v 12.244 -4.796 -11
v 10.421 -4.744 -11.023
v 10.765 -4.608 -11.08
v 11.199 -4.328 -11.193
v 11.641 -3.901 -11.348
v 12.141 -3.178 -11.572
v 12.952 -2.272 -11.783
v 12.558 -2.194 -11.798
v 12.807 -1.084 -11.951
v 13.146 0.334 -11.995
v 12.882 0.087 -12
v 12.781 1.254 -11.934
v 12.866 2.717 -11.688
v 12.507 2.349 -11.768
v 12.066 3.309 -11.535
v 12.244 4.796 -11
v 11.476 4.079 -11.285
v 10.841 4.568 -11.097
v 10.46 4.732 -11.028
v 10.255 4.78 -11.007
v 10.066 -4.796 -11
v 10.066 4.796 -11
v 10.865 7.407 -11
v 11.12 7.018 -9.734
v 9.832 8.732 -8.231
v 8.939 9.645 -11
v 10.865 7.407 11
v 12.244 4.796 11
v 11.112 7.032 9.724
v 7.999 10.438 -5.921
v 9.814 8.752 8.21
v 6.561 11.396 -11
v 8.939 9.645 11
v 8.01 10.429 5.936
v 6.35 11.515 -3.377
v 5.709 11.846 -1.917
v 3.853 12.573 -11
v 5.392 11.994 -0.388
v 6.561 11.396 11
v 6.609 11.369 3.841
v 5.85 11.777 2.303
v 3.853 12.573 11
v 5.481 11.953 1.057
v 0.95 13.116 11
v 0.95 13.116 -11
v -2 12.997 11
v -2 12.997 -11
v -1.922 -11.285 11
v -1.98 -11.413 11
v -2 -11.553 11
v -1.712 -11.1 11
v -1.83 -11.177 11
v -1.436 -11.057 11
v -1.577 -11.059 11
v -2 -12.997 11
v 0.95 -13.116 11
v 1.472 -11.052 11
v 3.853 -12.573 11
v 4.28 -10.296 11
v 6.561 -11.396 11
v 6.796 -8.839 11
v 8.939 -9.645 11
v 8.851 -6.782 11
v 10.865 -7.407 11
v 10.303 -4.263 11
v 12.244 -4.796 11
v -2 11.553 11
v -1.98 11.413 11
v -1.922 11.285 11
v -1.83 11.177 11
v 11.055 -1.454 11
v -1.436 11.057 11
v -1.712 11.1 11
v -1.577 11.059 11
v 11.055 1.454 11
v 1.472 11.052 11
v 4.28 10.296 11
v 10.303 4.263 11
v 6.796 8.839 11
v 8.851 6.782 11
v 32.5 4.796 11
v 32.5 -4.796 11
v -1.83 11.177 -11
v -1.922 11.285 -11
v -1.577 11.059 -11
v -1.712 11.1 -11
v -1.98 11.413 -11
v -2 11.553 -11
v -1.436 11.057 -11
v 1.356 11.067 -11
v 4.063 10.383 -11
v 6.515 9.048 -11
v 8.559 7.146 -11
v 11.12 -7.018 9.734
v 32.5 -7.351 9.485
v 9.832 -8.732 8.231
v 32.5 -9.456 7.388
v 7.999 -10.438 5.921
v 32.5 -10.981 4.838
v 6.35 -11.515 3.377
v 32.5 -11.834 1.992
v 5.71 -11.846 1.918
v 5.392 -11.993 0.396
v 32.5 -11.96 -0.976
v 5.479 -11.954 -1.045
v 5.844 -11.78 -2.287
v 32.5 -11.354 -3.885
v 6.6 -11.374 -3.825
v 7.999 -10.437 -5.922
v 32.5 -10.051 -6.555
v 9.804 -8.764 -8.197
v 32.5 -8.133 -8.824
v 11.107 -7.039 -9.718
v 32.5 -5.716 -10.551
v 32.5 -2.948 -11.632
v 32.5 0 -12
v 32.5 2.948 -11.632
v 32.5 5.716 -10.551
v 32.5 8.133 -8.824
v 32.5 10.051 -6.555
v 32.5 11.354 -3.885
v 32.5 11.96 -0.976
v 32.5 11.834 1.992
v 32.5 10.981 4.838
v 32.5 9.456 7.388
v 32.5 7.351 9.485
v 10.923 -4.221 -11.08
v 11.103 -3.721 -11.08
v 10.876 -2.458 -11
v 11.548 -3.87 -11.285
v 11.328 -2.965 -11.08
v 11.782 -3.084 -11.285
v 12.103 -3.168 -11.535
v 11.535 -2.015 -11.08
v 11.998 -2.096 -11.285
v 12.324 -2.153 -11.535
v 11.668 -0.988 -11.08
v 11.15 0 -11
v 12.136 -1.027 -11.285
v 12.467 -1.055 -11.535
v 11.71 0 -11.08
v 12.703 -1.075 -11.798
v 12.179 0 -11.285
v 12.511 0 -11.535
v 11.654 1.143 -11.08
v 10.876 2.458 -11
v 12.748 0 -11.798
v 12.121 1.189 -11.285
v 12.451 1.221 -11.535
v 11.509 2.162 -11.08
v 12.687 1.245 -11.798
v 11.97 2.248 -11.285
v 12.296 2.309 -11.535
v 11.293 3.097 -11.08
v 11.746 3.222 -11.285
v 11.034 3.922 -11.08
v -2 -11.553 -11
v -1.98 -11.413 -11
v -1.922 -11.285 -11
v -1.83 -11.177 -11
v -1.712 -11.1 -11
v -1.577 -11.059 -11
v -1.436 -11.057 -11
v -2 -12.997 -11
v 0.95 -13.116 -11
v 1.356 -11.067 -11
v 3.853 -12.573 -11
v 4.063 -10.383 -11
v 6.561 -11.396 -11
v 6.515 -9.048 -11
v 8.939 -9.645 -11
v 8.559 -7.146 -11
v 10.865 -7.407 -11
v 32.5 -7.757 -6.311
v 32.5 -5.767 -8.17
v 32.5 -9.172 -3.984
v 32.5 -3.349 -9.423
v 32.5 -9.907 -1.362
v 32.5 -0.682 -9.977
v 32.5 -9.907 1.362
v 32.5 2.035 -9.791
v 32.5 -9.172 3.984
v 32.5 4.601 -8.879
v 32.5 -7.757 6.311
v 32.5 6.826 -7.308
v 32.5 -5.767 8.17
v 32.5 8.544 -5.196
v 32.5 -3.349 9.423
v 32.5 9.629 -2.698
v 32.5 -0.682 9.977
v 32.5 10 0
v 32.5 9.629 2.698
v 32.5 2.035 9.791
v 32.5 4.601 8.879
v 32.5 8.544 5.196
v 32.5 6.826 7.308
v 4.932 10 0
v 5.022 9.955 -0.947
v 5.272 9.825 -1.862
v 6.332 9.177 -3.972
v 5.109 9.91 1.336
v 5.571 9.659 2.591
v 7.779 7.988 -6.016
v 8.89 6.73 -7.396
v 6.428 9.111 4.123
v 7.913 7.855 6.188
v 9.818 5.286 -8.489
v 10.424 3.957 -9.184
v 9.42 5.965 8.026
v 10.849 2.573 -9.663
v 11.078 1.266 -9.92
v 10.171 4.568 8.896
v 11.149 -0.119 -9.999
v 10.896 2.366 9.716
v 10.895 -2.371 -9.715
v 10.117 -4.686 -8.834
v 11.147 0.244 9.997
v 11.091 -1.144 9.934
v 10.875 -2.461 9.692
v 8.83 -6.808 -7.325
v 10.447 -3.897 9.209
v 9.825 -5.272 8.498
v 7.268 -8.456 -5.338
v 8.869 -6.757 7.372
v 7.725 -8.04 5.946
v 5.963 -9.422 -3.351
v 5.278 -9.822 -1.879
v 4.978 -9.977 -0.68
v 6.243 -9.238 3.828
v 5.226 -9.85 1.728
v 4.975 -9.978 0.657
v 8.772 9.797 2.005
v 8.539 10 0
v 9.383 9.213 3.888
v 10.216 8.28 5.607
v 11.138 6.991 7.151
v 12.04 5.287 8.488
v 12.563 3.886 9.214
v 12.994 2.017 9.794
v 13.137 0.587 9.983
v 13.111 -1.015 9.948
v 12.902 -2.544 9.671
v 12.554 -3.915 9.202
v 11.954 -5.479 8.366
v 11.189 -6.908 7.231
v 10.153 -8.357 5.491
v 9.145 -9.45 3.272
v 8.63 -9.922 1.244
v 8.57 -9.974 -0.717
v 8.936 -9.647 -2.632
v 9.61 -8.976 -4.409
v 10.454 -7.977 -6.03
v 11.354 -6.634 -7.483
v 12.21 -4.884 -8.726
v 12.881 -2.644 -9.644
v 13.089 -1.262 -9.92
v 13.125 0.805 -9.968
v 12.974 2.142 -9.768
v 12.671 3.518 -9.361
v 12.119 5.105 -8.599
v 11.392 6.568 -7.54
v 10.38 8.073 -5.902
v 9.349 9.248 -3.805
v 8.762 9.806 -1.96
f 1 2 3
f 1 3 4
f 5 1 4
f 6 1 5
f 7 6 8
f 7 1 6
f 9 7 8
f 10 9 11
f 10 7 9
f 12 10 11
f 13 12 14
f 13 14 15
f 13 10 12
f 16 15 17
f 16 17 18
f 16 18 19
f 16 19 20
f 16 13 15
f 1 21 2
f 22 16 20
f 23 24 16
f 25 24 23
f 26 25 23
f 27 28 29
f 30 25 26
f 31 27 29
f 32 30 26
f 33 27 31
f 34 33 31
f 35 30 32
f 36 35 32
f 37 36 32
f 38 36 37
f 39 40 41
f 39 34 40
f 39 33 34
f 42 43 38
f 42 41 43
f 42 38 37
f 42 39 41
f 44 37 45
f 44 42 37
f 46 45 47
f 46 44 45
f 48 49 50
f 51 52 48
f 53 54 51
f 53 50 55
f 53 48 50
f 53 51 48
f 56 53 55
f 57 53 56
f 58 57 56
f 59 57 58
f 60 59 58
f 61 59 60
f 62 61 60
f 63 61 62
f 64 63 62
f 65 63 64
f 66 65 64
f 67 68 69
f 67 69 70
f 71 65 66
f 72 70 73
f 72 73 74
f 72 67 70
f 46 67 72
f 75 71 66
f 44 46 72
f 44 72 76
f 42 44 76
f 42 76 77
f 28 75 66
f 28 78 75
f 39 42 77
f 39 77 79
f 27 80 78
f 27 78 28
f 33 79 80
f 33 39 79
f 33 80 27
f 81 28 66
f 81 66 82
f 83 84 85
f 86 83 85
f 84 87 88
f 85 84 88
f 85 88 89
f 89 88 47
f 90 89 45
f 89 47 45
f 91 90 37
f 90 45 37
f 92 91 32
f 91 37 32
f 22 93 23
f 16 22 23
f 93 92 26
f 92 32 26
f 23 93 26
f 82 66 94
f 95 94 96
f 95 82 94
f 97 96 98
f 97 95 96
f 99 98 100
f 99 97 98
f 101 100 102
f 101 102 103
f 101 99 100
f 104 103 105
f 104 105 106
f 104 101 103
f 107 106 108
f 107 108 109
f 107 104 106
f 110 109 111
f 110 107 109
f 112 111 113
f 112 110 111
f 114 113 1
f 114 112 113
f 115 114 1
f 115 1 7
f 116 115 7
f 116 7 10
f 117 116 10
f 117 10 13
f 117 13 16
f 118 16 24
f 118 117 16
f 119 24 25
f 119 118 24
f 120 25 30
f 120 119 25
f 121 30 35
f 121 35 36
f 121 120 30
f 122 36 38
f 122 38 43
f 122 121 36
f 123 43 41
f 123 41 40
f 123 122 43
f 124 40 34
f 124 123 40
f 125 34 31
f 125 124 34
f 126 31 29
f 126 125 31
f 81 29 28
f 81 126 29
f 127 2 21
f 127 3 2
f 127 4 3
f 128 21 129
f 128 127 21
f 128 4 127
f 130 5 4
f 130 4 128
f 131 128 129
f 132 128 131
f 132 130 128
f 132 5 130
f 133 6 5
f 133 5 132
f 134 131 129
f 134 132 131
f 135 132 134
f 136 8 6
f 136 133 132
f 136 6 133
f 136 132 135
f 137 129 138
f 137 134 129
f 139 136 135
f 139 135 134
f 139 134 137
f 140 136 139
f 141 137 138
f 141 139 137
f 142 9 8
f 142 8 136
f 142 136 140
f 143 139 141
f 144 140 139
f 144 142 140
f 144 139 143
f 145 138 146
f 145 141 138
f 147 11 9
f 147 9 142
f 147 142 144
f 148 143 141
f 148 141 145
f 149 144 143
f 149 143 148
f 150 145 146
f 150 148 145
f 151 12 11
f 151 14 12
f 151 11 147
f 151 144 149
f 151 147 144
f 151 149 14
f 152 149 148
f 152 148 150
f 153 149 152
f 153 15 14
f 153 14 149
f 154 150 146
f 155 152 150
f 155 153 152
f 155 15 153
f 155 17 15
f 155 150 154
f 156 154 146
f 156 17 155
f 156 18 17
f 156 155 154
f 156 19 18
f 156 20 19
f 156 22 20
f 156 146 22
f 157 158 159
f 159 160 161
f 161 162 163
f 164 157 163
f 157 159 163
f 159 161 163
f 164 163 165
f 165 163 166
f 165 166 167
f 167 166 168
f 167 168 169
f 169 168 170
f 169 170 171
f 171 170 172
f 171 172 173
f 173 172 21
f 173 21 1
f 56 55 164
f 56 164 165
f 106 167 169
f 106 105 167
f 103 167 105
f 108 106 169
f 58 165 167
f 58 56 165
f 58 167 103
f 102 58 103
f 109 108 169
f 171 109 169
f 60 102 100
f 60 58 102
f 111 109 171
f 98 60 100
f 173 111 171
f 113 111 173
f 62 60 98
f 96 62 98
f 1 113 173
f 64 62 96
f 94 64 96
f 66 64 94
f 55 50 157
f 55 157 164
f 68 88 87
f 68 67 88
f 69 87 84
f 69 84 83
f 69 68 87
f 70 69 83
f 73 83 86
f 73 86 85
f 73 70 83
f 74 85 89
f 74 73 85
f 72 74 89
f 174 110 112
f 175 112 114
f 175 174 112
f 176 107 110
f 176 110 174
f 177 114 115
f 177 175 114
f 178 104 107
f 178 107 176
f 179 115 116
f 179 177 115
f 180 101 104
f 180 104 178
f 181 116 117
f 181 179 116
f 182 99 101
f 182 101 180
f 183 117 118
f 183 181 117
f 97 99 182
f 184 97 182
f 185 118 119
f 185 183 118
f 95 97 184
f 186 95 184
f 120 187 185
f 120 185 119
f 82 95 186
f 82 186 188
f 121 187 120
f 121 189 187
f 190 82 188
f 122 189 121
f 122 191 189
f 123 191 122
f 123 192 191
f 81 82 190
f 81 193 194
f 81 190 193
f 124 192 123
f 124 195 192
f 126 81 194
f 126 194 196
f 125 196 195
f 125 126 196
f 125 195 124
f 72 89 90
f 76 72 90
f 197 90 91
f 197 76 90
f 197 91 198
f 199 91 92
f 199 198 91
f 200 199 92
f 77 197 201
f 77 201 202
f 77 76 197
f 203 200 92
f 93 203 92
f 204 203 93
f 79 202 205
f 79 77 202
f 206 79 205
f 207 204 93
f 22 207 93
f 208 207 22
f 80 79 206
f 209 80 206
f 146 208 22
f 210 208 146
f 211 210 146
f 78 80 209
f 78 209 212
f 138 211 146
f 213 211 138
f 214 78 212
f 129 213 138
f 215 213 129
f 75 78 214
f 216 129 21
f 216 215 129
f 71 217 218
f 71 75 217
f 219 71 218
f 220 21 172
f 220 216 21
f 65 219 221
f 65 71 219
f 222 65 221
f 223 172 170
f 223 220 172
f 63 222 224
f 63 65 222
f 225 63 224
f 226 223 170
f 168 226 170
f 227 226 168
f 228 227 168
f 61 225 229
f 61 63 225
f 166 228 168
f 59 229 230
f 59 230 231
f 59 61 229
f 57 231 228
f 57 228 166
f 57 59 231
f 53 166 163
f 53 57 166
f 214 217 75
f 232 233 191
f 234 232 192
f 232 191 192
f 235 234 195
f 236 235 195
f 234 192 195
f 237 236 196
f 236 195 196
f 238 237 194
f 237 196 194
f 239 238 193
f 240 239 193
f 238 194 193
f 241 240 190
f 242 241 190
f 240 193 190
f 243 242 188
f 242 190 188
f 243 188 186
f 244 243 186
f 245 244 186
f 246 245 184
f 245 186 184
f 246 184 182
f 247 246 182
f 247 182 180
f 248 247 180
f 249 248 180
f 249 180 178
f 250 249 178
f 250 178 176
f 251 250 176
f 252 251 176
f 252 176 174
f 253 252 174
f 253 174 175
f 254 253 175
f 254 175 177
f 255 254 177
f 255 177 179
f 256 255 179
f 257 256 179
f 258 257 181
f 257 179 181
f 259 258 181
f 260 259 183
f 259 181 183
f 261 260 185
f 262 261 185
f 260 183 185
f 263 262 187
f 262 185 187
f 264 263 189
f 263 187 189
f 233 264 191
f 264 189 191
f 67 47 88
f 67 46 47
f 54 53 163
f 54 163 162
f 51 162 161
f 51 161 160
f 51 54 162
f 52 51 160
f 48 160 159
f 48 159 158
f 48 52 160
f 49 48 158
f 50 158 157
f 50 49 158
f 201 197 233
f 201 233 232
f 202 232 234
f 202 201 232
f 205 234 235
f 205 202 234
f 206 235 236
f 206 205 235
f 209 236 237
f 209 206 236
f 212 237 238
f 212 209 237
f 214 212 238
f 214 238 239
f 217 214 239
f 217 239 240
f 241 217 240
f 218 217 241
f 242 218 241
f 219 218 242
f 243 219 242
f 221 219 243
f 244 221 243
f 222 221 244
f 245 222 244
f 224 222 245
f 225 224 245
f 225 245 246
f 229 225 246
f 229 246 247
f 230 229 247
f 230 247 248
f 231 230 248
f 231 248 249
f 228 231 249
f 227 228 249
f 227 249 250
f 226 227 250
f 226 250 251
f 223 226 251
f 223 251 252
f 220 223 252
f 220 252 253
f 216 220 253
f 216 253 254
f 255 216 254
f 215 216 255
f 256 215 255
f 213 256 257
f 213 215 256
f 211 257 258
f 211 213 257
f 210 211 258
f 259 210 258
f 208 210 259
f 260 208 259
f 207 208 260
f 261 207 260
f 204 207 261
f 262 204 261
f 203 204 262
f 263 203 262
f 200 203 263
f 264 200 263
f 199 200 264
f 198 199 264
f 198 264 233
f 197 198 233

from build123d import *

# Parameters (mm, degrees)
F1_DEPTH      = 11
F1_DEPTH_BACK = 11
F2_R          = 10
F3_DEPTH      = 25
F6_END_RADIUS = 13.15
F5_R          = 12
F5_R_2        = 10
F6_REACH      = 68.442125597
F7_T4_ANGLE   = 86.3533795546
F7_S5_R       = 12
F7_T6_DEPTH   = 12
F8_W          = 15.702219009
F8_H          = 5.1735627732
F9_DEPTH      = 32.5010001


# Not quite as in the source:
# - a fillet or chamfer that OpenCascade refuses, or shapes differently, is made with other operations: its cross-section is extruded or revolved along the edge and cut away or added


with BuildPart() as f1:
    # F0 (on Top) → F1 (new body, two sides)
    with BuildSketch(Plane.XY) as f1_sk:
        with BuildLine():
            ThreePointArc((-1.4356223176, 11.0571917122), (11.15, 0), (-1.4356223176, -11.0571917122))
            ThreePointArc((-1.4356223176, -11.0571917122), (-1.8300084535, -11.1774045329), (-2, -11.5530299056))
            Line((-2, -11.5530299056), (-2, -12.997018889))
            ThreePointArc((-2, -12.997018889), (13.15, 0), (-2, 12.997018889))
            Line((-2, 12.997018889), (-2, 11.5530299056))
            ThreePointArc((-2, 11.5530299056), (-1.8300084535, 11.1774045329), (-1.4356223176, 11.0571917122))
        make_face()
    extrude(amount=F1_DEPTH)
    extrude(f1_sk.sketch, amount=-F1_DEPTH_BACK)

    # F2 (on Right) → F3 (cut)
    with BuildSketch(Plane.YZ):
        Circle(F2_R)
    extrude(amount=F3_DEPTH, mode=Mode.SUBTRACT)

    f6_end = (Plane(origin=(0, 0, 0), x_dir=(-1, 0, 0), z_dir=(0, 0, -1)) * Cylinder(F6_END_RADIUS, 211.856580101, mode=Mode.PRIVATE)).faces().sort_by_distance((13.15, 0, 10.6251383555))[0]
    # F5 (on offset) → F6 (join, up to the whole of a round face its end follows)
    with BuildSketch(Plane.YZ.offset(32.5)):
        Circle(F5_R)
        Circle(F5_R_2, mode=Mode.SUBTRACT)
    f6_long = extrude(amount=-F6_REACH, mode=Mode.PRIVATE)
    add(split(f6_long, bisect_by=f6_end, keep=Keep.ALL, mode=Mode.PRIVATE).solids().sort_by_distance((32.5, -11.660588745, 0))[0])

    # F7: fillet of radius 2 on 1 edges, made by hand


with BuildPart() as f7_tool2:
    # F7_s3 → F7_t4 (revolve)
    with BuildSketch(Plane(origin=(0, 0, 0), x_dir=(0, 0, 1), z_dir=(-0.6842504755, -0.7292470684, 0))):
        with BuildLine():
            ThreePointArc((-11, -11.15), (-11.5857864376, -12.5642135624), (-13, -13.15))
            Line((-13, -13.15), (-11, -13.15))
            Line((-11, -13.15), (-11, -11.15))
        make_face()
    revolve(axis=Axis((0, 0, -11), (0, 0, 1)), revolution_arc=F7_T4_ANGLE)

    # F7_s5 → F7_t6 (intersect, symmetric)
    with BuildSketch(Plane.YZ.offset(10.7)):
        Circle(F7_S5_R)
    extrude(amount=F7_T6_DEPTH, both=True, mode=Mode.INTERSECT)


with BuildPart() as f1_1:
    add(f1.part)

    # F7_t1: union F7_tool2
    add(f7_tool2.part)

    # F8 (on Right) → F9 (cut, through all)
    with BuildSketch(Plane.YZ):
        with Locations((0.481082825, 13.5867813866)):
            Rectangle(F8_W, F8_H)
    extrude(amount=F9_DEPTH, mode=Mode.SUBTRACT)


solid = f1_1.part
